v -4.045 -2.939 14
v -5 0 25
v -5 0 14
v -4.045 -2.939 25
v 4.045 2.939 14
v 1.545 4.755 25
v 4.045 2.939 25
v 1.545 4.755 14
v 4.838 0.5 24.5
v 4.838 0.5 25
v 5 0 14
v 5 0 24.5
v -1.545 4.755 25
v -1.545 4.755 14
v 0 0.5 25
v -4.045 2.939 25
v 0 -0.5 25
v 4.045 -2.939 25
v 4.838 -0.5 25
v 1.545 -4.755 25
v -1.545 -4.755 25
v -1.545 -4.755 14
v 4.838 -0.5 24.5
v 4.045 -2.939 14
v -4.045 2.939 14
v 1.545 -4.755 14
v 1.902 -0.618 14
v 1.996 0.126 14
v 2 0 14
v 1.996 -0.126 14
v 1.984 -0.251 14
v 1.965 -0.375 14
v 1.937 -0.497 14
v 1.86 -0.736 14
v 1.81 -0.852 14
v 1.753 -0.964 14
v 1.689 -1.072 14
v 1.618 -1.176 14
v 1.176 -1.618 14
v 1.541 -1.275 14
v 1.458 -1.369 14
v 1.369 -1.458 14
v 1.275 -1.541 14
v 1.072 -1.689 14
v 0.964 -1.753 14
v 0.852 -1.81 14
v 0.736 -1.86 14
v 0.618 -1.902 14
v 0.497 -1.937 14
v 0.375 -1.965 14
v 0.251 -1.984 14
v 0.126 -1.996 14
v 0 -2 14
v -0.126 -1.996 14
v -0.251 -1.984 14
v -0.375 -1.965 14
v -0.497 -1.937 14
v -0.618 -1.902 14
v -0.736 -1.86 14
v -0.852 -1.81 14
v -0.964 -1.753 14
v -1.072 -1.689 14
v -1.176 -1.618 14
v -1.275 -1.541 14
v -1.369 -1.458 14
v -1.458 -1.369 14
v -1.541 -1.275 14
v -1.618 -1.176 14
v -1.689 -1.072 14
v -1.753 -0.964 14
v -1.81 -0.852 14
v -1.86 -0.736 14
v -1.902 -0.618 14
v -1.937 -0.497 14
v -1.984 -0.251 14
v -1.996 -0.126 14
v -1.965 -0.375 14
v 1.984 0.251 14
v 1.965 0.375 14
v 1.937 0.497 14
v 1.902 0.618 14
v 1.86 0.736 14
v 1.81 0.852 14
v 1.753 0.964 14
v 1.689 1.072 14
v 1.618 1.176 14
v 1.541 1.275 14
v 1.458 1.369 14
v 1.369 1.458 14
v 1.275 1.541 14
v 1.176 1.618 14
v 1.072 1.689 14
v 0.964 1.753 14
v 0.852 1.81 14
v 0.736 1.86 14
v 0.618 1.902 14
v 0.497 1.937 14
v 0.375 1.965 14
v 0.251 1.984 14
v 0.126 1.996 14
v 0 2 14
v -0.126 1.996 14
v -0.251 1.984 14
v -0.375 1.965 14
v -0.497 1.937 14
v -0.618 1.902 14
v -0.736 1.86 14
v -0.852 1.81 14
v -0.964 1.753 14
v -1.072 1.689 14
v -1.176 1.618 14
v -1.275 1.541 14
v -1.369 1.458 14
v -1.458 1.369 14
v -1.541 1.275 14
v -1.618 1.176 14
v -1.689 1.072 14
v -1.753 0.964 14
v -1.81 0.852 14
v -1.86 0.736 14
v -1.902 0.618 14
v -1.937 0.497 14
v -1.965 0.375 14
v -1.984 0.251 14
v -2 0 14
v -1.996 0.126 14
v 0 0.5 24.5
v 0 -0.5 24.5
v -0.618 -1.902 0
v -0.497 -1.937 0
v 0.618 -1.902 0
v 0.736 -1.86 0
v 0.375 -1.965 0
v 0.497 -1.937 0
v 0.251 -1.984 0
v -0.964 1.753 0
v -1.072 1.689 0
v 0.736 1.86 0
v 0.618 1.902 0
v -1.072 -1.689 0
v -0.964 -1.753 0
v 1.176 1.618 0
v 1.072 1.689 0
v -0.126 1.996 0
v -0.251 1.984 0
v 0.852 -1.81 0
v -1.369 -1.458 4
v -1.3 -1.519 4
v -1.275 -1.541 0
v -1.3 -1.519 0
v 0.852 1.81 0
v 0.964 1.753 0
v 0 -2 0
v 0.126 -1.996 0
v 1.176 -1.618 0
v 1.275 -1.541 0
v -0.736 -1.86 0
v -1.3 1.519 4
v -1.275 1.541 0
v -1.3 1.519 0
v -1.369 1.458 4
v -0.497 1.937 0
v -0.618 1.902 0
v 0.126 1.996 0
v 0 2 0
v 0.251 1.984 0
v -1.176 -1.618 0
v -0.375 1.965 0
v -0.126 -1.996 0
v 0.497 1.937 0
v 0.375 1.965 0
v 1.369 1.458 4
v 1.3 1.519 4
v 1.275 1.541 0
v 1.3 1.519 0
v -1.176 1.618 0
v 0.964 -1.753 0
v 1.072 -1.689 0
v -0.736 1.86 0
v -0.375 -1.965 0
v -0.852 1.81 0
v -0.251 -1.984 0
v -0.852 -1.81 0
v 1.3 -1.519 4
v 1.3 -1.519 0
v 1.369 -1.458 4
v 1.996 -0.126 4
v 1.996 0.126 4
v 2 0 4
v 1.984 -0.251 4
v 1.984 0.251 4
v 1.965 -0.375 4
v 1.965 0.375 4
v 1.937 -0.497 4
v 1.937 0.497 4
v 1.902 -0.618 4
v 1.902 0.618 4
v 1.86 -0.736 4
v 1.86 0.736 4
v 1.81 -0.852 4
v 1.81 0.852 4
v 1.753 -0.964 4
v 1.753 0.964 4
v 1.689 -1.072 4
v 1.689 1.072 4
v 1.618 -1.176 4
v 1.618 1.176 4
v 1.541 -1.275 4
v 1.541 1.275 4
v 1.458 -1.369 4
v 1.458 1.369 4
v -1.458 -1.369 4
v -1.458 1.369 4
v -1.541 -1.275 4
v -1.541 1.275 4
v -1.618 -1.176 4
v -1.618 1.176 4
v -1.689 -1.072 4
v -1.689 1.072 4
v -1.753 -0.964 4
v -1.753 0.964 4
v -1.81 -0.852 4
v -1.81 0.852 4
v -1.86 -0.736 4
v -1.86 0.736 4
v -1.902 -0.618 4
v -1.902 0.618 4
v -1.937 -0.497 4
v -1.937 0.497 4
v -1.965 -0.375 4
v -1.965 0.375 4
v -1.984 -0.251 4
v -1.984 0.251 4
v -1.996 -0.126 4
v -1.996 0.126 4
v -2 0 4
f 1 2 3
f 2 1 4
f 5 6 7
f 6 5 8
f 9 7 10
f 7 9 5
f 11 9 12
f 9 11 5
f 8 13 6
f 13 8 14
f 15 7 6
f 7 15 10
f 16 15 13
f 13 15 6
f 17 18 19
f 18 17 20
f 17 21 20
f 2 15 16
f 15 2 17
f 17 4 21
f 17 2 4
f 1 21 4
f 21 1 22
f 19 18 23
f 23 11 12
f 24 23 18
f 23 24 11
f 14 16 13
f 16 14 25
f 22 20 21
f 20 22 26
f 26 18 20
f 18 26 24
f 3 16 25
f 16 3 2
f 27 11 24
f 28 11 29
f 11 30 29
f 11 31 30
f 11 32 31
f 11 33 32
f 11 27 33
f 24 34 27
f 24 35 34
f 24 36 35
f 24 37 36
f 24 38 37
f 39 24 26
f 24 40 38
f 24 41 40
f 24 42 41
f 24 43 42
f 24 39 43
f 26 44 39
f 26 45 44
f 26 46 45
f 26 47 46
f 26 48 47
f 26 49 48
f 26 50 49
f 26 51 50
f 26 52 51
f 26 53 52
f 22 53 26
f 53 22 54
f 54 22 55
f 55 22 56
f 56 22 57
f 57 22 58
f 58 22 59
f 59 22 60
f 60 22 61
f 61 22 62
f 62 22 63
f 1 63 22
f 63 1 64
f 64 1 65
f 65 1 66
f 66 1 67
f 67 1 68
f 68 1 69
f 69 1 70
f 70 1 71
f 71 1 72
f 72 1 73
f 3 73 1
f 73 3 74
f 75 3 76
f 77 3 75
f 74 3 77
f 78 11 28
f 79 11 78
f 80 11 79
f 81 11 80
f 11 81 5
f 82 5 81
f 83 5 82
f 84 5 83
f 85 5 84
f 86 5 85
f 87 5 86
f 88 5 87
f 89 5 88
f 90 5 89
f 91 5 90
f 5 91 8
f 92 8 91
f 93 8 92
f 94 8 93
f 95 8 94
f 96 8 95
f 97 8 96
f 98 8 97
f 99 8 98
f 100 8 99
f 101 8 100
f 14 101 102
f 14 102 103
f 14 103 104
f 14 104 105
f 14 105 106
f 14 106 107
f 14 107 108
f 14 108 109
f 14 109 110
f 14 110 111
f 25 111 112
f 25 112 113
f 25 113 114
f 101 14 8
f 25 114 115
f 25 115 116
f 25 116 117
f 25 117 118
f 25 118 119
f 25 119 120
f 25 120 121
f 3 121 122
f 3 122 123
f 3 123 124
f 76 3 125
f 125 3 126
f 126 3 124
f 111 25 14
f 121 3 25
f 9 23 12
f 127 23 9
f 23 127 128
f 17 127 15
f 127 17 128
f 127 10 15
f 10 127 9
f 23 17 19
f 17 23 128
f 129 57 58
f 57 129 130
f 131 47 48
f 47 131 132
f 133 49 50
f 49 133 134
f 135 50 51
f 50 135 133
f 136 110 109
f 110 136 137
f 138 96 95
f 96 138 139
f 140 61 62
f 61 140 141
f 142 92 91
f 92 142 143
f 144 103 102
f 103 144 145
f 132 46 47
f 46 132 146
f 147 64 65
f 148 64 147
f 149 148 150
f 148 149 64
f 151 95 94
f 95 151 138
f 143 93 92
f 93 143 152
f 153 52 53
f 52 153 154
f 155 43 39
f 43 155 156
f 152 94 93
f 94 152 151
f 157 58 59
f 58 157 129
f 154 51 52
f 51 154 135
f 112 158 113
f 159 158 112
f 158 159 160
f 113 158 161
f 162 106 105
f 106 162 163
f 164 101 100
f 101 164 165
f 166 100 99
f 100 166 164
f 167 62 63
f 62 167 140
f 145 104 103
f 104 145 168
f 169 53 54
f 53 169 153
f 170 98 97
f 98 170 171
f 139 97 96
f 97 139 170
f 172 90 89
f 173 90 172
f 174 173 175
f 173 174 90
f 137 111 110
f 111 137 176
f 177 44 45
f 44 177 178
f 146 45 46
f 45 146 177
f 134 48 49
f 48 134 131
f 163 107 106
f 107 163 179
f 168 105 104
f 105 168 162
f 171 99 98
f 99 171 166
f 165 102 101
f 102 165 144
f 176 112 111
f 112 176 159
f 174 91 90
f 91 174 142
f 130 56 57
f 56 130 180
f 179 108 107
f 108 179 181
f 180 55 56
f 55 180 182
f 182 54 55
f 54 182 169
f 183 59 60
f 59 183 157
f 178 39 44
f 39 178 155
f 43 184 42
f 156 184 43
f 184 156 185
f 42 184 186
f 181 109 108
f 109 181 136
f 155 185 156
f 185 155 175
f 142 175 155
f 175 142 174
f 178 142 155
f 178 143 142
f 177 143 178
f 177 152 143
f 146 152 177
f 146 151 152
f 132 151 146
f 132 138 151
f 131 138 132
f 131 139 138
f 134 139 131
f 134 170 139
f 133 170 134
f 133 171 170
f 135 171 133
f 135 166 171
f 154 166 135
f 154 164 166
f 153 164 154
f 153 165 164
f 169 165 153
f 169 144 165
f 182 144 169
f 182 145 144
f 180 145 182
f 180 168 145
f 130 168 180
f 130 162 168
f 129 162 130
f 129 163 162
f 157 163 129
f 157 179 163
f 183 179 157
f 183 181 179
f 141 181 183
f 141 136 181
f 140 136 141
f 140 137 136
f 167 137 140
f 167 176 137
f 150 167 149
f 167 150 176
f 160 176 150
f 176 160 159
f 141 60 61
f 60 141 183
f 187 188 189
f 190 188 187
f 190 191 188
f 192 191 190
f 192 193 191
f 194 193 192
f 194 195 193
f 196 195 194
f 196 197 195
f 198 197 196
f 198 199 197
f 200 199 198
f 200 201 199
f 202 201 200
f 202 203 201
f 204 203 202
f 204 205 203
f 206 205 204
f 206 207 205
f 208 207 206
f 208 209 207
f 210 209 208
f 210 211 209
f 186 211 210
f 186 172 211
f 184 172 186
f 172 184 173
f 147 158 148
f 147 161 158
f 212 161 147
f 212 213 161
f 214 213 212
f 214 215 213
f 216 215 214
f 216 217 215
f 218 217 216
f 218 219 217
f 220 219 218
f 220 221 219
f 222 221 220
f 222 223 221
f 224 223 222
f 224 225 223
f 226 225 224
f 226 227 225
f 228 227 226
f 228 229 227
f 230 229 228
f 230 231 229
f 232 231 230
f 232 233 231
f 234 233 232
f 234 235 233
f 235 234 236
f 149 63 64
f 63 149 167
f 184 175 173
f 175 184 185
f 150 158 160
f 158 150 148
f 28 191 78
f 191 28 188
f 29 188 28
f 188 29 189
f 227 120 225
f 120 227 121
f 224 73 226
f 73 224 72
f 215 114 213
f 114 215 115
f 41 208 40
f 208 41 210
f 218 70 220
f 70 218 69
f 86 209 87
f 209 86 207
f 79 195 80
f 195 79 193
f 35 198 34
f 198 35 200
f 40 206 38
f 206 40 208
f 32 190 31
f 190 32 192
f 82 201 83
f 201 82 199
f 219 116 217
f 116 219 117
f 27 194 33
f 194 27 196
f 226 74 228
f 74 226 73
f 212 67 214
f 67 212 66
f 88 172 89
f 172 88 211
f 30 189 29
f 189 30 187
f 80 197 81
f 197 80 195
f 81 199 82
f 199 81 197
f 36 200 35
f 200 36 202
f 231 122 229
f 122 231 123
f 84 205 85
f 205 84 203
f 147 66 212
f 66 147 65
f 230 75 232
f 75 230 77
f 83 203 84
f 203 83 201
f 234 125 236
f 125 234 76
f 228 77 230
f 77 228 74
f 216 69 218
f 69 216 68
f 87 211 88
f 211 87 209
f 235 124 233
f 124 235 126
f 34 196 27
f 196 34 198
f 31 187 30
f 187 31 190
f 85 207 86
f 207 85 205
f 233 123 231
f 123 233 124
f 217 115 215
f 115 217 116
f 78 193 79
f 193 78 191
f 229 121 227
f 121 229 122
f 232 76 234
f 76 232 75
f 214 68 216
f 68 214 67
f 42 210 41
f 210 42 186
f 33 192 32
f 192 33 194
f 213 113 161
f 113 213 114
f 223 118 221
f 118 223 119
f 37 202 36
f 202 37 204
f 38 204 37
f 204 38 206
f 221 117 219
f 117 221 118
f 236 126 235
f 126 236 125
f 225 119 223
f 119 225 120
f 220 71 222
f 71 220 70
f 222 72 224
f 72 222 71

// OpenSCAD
union(){
    difference(){
        translate([0, 0, 14])
            cylinder(11, 5, 5, $fn = 10);
        translate([0, -.5, 24.5])
            cube([5, 1, .5]);
    }
    translate([0, 0, 4])
        cylinder(10, 2, 2, $fn = 100);
    difference(){
        cylinder(4, 2, 2, $fn = 100);
        translate([2-(1.6/2) + .1, -5, 0])
            cube([10, 10, 10]);
        translate([-(2-(1.6/2))-10 - .1, -5, 0])
            cube([10, 10, 10]);
    }    
}
